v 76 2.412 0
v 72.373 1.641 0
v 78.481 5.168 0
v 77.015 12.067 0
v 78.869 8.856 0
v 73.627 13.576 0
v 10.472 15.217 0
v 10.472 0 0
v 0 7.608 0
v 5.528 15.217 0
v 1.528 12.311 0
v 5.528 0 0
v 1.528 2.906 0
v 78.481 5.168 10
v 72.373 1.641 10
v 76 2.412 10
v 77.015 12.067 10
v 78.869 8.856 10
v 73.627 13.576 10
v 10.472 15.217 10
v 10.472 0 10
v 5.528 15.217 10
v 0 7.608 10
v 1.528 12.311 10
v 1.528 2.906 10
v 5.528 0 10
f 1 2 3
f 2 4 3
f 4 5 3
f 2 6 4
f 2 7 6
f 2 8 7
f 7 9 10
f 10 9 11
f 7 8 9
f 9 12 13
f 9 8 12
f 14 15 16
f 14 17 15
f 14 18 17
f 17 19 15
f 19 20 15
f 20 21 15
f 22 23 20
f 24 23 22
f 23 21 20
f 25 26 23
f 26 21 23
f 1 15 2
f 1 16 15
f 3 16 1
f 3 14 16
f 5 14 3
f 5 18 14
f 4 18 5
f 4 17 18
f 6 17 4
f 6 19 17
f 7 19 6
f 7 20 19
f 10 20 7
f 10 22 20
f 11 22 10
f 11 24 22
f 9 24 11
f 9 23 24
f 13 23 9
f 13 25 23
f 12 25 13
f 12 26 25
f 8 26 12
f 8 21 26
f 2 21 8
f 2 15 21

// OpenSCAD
$fn = 32;

// ----------------------------------------------------------------------
// Lever arm: two bosses 16 and 12 mm, 65 mm between centres
// ----------------------------------------------------------------------

// --- parameters (mm) ---
profile_height = 10;      // extrusion height
profile_points = 13;      // points of the closed outline

profile = [[0, 7.608], [1.528, 2.906], [5.528, 0], [10.472, 0], [72.373, 1.641], [76, 2.412], [78.481, 5.168], [78.869, 8.856], [77.015, 12.067], [73.627, 13.576], [10.472, 15.217], [5.528, 15.217], [1.528, 12.311]];  // single closed polygon, 13 points, counter clockwise

// --- the one profile operation ---
linear_extrude(height = profile_height) polygon(points = profile);
